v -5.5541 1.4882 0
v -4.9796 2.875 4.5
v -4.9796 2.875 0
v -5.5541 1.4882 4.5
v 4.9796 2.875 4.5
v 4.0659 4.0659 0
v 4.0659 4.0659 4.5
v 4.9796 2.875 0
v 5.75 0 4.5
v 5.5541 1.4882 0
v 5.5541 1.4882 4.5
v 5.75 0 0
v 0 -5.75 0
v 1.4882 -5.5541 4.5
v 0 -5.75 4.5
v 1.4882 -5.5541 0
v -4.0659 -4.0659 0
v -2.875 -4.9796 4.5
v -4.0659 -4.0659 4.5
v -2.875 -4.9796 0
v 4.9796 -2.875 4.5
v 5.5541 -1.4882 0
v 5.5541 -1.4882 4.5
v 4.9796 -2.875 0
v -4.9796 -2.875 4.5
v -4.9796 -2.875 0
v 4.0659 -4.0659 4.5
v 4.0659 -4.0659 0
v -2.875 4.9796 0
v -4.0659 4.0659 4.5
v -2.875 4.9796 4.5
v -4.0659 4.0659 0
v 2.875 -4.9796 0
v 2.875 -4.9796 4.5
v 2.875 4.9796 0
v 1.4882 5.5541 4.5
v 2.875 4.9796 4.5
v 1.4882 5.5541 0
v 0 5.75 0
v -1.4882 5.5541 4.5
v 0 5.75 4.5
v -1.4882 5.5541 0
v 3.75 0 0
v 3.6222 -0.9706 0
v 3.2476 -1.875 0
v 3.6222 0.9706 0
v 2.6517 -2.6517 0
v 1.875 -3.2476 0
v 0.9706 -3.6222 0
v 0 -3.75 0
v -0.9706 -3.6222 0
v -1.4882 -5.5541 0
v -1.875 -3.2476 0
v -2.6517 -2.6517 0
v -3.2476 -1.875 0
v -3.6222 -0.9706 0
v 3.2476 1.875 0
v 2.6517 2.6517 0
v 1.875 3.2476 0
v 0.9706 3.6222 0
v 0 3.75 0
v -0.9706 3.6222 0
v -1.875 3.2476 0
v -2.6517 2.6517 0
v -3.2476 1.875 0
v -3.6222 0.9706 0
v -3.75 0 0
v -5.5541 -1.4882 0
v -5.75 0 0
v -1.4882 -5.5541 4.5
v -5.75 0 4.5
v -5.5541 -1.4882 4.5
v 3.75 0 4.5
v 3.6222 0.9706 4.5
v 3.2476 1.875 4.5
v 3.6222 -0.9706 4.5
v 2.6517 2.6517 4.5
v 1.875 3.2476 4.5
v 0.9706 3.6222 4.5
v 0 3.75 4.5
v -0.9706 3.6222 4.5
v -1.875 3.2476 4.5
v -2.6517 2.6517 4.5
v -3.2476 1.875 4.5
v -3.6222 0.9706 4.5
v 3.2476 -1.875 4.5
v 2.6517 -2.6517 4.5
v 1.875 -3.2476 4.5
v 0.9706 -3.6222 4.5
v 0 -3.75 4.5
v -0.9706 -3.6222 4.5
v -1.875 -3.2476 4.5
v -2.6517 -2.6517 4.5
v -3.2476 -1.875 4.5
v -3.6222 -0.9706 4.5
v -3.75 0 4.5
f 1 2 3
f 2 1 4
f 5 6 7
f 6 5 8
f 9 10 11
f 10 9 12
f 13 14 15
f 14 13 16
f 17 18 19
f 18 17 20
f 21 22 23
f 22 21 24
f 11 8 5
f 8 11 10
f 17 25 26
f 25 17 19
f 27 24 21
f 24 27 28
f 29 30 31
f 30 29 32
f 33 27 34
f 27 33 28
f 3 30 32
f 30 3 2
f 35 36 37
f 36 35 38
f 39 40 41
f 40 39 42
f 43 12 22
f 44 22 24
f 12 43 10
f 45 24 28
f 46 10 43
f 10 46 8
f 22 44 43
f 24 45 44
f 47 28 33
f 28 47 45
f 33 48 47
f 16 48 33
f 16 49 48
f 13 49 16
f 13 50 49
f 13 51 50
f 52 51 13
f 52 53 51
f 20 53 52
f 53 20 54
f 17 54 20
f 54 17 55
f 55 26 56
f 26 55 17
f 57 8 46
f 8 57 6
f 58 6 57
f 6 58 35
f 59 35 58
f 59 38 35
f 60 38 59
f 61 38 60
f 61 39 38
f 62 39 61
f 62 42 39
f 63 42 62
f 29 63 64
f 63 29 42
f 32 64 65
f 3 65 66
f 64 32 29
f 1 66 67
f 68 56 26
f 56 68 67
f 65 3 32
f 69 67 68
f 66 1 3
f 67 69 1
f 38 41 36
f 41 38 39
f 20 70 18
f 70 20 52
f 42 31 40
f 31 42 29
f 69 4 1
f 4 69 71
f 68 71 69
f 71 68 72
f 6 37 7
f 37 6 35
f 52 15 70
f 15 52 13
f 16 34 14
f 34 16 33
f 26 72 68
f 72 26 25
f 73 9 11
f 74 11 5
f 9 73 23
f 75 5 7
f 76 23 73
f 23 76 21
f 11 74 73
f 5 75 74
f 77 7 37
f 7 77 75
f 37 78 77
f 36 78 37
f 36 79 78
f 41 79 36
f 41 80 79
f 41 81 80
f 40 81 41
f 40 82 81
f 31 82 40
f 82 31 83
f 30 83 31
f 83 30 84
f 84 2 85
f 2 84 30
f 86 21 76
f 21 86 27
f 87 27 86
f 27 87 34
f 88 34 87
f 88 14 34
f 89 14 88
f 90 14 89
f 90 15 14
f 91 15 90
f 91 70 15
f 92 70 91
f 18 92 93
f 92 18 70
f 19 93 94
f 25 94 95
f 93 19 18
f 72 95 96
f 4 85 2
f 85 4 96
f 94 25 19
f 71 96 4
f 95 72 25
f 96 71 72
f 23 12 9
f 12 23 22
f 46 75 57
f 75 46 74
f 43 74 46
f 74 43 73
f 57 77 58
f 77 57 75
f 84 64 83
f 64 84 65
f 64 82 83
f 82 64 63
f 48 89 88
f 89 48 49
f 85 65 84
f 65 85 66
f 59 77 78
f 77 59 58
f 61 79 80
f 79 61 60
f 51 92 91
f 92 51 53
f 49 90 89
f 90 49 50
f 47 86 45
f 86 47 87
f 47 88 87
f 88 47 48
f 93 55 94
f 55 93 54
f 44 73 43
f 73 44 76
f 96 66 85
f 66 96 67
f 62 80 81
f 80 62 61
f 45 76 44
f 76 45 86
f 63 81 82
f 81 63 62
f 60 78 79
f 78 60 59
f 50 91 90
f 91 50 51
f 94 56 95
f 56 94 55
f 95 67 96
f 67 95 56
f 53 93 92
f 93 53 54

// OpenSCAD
outer_diameter = 11.5; //mm
inner_diameter = 7.5; //mm
height = 4.5;//mm
$fn=24;

difference() {
  cylinder(h=height, d=outer_diameter);
  cylinder(h=height+0.01, d=inner_diameter);
}
